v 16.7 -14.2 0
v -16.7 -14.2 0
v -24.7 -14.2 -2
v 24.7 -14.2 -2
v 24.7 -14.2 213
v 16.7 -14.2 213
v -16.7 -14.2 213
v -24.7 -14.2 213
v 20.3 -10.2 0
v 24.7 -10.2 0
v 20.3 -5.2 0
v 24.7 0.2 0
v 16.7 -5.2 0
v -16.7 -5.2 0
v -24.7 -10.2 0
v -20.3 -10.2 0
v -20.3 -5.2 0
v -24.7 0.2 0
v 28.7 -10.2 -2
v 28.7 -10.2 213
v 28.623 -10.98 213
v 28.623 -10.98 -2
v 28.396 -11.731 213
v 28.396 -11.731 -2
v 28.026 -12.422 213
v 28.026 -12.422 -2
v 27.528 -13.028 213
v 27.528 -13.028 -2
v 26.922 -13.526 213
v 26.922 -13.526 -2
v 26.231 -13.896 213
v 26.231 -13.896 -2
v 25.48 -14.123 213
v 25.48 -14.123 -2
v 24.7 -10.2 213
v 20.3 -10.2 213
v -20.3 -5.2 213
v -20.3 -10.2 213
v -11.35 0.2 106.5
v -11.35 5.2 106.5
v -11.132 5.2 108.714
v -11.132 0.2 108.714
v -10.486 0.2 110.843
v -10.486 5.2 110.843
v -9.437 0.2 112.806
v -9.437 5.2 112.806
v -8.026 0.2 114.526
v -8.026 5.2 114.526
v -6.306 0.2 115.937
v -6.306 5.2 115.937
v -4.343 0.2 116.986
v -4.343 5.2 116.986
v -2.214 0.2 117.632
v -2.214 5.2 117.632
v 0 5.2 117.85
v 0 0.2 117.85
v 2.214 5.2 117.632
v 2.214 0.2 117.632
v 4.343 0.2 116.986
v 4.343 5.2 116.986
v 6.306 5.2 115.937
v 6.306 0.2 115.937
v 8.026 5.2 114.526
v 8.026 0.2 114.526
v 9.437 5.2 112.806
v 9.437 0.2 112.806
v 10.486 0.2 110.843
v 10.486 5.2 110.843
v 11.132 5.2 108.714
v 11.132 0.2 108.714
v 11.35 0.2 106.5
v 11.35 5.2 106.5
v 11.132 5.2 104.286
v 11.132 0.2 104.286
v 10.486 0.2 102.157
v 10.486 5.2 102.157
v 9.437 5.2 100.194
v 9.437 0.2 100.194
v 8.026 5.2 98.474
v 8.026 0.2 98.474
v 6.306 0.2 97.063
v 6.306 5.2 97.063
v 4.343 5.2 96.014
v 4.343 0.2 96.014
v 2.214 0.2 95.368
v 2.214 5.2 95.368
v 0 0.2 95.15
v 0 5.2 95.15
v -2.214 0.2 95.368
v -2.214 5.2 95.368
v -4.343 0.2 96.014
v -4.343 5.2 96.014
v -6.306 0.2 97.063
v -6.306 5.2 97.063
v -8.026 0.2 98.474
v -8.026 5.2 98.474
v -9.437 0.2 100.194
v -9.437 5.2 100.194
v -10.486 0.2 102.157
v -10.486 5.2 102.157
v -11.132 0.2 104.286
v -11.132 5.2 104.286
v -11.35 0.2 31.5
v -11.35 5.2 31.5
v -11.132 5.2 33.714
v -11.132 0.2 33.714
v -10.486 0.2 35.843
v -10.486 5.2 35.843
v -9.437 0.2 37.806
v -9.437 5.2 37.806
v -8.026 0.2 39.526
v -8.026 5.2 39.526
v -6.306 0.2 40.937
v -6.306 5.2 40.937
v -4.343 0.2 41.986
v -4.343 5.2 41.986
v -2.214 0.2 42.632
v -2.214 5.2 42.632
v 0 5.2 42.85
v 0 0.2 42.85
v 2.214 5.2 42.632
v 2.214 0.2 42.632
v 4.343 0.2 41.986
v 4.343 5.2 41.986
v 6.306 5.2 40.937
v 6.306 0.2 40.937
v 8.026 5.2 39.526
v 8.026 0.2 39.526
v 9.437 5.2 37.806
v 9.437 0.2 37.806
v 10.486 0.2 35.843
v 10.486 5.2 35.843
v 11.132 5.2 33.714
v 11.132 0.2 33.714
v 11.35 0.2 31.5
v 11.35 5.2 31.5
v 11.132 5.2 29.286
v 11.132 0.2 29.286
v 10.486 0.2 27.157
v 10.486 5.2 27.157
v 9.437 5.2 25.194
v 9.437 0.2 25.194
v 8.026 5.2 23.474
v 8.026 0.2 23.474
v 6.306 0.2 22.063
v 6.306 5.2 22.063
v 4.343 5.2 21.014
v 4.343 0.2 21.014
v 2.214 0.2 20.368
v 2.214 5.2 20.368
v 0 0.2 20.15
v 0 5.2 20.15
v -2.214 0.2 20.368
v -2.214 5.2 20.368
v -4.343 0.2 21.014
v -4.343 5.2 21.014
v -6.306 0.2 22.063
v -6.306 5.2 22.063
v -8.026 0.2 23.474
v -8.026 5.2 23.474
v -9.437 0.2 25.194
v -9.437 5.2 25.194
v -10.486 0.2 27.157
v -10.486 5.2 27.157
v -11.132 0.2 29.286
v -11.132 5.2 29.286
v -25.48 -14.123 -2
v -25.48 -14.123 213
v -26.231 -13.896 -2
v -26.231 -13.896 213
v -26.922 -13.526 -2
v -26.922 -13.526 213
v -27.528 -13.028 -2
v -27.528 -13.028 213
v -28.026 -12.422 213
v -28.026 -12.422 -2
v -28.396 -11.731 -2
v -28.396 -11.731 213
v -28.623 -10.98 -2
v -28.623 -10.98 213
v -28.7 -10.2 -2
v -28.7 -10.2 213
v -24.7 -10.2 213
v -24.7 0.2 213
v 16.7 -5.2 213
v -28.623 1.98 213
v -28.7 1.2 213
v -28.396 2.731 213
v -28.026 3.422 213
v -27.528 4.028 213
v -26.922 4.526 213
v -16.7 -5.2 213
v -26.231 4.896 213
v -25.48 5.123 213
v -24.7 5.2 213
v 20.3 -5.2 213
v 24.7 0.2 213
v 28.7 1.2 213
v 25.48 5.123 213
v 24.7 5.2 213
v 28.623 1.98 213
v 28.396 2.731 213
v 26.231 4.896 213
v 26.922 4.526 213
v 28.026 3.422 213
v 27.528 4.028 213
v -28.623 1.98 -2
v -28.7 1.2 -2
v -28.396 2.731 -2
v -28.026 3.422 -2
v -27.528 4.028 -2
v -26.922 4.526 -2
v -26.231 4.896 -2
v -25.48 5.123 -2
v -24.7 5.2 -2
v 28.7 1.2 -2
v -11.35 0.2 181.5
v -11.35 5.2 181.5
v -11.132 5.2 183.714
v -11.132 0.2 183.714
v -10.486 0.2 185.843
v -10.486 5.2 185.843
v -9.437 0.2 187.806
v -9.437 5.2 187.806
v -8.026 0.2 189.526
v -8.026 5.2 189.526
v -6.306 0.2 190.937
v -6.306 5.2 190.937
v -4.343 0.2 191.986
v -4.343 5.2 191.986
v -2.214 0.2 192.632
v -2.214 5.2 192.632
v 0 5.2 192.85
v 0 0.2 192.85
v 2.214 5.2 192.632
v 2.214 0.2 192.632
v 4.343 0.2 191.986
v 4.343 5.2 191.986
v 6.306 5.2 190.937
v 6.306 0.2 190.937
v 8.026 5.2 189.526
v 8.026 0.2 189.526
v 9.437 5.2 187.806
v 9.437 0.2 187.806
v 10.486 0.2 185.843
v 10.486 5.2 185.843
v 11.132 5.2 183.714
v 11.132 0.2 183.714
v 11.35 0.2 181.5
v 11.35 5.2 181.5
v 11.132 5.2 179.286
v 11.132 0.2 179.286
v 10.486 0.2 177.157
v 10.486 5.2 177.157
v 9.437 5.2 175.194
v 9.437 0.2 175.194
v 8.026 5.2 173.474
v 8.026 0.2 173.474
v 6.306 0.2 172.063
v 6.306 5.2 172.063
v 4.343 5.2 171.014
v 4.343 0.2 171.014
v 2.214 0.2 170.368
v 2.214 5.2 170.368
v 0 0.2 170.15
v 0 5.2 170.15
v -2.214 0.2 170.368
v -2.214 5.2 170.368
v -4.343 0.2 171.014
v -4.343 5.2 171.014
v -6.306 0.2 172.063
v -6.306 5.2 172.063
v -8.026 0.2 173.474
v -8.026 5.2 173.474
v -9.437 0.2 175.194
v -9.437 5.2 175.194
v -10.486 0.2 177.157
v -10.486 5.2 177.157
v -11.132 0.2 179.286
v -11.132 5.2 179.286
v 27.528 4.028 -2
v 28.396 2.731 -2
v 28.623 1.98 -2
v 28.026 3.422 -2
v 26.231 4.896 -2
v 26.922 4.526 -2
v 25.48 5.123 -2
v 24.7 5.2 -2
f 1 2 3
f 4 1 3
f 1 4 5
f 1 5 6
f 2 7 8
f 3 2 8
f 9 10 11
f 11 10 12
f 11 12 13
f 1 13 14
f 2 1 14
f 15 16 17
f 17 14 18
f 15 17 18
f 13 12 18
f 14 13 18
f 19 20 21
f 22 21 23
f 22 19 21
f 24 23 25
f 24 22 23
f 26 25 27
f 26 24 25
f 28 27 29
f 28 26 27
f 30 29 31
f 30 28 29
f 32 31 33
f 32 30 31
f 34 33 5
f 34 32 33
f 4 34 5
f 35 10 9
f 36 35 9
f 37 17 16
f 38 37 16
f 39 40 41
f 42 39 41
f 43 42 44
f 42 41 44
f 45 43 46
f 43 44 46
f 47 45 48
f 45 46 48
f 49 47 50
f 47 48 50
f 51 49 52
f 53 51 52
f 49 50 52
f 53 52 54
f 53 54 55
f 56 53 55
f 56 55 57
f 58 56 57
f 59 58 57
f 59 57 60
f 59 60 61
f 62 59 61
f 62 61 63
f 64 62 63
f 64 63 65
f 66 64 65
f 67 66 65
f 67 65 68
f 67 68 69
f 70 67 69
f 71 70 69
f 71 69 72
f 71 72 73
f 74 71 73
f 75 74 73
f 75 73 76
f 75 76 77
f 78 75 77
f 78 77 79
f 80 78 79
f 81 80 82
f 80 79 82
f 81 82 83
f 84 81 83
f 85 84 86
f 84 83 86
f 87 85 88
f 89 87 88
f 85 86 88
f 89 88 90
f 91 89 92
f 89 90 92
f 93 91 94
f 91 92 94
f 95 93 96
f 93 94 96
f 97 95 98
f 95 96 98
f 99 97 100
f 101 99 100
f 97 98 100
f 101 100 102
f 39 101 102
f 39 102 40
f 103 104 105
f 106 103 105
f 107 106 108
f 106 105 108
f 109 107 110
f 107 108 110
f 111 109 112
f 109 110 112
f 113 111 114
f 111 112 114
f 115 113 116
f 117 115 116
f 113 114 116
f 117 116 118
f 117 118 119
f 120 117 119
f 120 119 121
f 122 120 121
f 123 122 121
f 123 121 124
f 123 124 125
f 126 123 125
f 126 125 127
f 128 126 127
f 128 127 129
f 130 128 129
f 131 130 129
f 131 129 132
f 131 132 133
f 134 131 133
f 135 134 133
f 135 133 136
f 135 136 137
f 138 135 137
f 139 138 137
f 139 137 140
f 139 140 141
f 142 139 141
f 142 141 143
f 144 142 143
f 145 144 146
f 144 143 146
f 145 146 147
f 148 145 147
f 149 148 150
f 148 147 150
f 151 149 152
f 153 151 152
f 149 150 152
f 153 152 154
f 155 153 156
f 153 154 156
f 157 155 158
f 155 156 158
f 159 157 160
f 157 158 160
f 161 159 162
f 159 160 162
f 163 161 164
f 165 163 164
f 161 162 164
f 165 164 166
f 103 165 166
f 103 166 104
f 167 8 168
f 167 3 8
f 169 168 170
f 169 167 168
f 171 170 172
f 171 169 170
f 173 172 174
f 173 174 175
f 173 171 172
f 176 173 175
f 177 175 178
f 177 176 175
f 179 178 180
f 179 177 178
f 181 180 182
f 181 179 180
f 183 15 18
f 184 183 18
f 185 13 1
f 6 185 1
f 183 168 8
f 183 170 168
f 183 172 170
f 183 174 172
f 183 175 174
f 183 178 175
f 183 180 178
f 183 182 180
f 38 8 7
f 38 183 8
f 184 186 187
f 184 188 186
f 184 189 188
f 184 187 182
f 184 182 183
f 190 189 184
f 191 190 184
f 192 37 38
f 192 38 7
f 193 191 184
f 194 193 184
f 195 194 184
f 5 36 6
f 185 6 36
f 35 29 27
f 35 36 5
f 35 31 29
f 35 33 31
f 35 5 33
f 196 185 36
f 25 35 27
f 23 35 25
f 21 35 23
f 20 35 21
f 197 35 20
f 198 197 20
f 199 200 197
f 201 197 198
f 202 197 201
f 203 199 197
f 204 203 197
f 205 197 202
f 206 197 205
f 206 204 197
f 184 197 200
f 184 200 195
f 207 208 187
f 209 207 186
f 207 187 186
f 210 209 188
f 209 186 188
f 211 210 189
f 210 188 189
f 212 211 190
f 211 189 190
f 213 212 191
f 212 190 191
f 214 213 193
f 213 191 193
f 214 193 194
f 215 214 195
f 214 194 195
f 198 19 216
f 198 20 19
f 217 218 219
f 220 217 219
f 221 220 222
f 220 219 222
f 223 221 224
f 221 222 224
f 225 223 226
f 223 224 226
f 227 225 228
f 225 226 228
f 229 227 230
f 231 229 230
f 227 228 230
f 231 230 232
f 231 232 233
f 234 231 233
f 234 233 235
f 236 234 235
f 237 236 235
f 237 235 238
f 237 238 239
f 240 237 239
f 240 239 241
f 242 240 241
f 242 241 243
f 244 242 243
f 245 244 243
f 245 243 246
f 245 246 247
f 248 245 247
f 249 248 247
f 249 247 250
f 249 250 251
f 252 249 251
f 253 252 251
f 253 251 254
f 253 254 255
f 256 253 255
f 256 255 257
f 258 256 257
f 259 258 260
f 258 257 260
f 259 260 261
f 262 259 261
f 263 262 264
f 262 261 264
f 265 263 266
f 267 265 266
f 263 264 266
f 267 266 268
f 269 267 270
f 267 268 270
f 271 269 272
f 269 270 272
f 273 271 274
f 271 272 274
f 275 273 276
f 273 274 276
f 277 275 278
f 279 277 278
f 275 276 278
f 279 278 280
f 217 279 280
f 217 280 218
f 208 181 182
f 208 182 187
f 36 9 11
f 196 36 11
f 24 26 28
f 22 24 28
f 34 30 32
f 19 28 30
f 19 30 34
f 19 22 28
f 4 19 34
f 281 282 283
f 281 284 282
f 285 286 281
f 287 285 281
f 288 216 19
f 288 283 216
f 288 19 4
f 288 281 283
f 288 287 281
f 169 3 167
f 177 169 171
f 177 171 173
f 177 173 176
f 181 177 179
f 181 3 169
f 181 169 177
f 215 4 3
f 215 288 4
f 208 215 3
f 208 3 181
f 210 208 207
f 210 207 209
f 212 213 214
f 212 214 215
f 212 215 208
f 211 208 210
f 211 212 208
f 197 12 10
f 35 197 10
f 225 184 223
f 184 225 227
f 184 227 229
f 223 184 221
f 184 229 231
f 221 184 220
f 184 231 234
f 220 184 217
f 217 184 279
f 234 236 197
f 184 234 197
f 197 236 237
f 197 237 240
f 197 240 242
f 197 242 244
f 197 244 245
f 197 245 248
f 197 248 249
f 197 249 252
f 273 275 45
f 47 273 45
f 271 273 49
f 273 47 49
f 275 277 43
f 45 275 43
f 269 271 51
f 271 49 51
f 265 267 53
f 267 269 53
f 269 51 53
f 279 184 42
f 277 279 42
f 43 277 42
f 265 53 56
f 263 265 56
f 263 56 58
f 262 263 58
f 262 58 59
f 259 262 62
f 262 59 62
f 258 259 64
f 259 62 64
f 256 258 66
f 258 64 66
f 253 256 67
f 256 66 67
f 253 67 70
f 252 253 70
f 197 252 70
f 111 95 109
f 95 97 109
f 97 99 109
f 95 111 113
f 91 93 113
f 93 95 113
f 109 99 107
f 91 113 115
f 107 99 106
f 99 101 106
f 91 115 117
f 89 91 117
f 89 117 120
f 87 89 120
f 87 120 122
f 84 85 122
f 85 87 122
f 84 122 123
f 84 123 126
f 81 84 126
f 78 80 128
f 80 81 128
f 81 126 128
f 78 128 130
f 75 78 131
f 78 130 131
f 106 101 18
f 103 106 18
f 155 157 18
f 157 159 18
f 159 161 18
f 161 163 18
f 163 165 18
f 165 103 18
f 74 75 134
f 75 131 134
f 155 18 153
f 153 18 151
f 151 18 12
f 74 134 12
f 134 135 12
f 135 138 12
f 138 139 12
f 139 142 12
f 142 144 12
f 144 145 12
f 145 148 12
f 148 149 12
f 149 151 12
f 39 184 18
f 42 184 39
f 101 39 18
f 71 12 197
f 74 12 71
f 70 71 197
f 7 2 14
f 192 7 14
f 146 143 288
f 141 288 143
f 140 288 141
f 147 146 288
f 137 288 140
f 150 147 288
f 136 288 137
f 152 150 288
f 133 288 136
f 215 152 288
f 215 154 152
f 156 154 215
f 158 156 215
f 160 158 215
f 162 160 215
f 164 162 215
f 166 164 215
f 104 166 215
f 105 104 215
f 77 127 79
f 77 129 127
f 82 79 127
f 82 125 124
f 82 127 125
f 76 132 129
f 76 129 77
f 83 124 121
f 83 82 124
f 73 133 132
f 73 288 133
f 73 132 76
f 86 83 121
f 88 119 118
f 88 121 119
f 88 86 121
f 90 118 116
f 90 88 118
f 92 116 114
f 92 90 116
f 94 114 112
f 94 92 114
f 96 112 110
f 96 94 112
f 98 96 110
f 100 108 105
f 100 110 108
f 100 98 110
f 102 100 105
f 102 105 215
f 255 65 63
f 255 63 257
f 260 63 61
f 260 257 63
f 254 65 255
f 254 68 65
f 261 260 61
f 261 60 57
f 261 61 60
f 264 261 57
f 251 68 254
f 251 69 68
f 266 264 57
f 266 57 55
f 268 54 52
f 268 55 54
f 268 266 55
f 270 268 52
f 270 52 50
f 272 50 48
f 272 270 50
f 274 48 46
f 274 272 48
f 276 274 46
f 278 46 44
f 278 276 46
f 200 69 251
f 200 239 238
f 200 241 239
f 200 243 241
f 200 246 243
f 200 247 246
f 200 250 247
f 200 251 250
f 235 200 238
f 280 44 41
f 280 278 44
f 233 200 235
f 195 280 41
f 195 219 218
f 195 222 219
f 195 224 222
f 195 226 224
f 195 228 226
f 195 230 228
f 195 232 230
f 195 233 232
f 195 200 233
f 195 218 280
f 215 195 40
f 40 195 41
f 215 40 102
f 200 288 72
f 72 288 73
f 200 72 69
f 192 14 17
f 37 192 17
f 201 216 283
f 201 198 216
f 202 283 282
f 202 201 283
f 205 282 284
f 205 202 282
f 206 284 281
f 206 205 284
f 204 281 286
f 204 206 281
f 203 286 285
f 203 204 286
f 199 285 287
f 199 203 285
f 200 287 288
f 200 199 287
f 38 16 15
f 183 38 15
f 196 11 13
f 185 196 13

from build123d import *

# Parameters (mm, degrees)
BOSS_EXTRUDE2_DEPTH = 213
SKETCH2_W           = 57.4
SKETCH2_H           = 19.4
BOSS_EXTRUDE3_DEPTH = 2
FILLET2_R           = 4
SKETCH3_R           = 11.35
CUT_EXTRUDE1_DEPTH  = 59


with BuildPart() as part:
    # Sketch1 → Boss-Extrude2 (new body)
    with BuildSketch(Plane.XY):
        Polygon((-24.7, 0.2), (0, 0.2), (0, 5.2), (-28.7, 5.2), (-28.7, -14.2), (-16.7, -14.2), (-16.7, -10), (-16.7, -5.2), (-20.3, -5.2), (-20.3, -10.2), (-24.7, -10.2), align=None)
        Polygon((0, 5.2), (0, 0.2), (24.7, 0.2), (24.7, -10.2), (20.3, -10.2), (20.3, -5.2), (16.7, -5.2), (16.7, -10), (16.7, -14.2), (28.7, -14.2), (28.7, 5.2), align=None)
    extrude(amount=BOSS_EXTRUDE2_DEPTH)

    # Sketch2 → Boss-Extrude3 (add)
    with BuildSketch(Plane(origin=(0, 0, 0), x_dir=(-1, 0, 0), z_dir=(0, 0, -1))):
        with Locations((0, -4.5)):
            Rectangle(SKETCH2_W, SKETCH2_H)
    extrude(amount=BOSS_EXTRUDE3_DEPTH)

    # Fillet2
    fillet2_edges = [part.edges().sort_by_distance(p)[0] for p in [
        (-28.7, -14.2, 105.5),
        (-28.7, 5.2, 105.5),
        (28.7, 5.2, 105.5),
        (28.7, -14.2, 105.5),
    ]]
    fillet(fillet2_edges, radius=FILLET2_R)

    # Sketch3 → Cut-Extrude1 (cut)
    with BuildSketch(Plane(origin=(0, 5.2, 0), x_dir=(1, 0, 0), z_dir=(0, 1, 0))):
        with Locations(Location((0, -31.5, 0), (0, 0, 180))):
            Circle(SKETCH3_R)
        with Locations(Location((0, -106.5, 0), (0, 0, 180))):
            Circle(SKETCH3_R)
        with Locations(Location((0, -181.5, 0), (0, 0, 180))):
            Circle(SKETCH3_R)
    extrude(amount=-CUT_EXTRUDE1_DEPTH, mode=Mode.SUBTRACT)


solid = part.part
